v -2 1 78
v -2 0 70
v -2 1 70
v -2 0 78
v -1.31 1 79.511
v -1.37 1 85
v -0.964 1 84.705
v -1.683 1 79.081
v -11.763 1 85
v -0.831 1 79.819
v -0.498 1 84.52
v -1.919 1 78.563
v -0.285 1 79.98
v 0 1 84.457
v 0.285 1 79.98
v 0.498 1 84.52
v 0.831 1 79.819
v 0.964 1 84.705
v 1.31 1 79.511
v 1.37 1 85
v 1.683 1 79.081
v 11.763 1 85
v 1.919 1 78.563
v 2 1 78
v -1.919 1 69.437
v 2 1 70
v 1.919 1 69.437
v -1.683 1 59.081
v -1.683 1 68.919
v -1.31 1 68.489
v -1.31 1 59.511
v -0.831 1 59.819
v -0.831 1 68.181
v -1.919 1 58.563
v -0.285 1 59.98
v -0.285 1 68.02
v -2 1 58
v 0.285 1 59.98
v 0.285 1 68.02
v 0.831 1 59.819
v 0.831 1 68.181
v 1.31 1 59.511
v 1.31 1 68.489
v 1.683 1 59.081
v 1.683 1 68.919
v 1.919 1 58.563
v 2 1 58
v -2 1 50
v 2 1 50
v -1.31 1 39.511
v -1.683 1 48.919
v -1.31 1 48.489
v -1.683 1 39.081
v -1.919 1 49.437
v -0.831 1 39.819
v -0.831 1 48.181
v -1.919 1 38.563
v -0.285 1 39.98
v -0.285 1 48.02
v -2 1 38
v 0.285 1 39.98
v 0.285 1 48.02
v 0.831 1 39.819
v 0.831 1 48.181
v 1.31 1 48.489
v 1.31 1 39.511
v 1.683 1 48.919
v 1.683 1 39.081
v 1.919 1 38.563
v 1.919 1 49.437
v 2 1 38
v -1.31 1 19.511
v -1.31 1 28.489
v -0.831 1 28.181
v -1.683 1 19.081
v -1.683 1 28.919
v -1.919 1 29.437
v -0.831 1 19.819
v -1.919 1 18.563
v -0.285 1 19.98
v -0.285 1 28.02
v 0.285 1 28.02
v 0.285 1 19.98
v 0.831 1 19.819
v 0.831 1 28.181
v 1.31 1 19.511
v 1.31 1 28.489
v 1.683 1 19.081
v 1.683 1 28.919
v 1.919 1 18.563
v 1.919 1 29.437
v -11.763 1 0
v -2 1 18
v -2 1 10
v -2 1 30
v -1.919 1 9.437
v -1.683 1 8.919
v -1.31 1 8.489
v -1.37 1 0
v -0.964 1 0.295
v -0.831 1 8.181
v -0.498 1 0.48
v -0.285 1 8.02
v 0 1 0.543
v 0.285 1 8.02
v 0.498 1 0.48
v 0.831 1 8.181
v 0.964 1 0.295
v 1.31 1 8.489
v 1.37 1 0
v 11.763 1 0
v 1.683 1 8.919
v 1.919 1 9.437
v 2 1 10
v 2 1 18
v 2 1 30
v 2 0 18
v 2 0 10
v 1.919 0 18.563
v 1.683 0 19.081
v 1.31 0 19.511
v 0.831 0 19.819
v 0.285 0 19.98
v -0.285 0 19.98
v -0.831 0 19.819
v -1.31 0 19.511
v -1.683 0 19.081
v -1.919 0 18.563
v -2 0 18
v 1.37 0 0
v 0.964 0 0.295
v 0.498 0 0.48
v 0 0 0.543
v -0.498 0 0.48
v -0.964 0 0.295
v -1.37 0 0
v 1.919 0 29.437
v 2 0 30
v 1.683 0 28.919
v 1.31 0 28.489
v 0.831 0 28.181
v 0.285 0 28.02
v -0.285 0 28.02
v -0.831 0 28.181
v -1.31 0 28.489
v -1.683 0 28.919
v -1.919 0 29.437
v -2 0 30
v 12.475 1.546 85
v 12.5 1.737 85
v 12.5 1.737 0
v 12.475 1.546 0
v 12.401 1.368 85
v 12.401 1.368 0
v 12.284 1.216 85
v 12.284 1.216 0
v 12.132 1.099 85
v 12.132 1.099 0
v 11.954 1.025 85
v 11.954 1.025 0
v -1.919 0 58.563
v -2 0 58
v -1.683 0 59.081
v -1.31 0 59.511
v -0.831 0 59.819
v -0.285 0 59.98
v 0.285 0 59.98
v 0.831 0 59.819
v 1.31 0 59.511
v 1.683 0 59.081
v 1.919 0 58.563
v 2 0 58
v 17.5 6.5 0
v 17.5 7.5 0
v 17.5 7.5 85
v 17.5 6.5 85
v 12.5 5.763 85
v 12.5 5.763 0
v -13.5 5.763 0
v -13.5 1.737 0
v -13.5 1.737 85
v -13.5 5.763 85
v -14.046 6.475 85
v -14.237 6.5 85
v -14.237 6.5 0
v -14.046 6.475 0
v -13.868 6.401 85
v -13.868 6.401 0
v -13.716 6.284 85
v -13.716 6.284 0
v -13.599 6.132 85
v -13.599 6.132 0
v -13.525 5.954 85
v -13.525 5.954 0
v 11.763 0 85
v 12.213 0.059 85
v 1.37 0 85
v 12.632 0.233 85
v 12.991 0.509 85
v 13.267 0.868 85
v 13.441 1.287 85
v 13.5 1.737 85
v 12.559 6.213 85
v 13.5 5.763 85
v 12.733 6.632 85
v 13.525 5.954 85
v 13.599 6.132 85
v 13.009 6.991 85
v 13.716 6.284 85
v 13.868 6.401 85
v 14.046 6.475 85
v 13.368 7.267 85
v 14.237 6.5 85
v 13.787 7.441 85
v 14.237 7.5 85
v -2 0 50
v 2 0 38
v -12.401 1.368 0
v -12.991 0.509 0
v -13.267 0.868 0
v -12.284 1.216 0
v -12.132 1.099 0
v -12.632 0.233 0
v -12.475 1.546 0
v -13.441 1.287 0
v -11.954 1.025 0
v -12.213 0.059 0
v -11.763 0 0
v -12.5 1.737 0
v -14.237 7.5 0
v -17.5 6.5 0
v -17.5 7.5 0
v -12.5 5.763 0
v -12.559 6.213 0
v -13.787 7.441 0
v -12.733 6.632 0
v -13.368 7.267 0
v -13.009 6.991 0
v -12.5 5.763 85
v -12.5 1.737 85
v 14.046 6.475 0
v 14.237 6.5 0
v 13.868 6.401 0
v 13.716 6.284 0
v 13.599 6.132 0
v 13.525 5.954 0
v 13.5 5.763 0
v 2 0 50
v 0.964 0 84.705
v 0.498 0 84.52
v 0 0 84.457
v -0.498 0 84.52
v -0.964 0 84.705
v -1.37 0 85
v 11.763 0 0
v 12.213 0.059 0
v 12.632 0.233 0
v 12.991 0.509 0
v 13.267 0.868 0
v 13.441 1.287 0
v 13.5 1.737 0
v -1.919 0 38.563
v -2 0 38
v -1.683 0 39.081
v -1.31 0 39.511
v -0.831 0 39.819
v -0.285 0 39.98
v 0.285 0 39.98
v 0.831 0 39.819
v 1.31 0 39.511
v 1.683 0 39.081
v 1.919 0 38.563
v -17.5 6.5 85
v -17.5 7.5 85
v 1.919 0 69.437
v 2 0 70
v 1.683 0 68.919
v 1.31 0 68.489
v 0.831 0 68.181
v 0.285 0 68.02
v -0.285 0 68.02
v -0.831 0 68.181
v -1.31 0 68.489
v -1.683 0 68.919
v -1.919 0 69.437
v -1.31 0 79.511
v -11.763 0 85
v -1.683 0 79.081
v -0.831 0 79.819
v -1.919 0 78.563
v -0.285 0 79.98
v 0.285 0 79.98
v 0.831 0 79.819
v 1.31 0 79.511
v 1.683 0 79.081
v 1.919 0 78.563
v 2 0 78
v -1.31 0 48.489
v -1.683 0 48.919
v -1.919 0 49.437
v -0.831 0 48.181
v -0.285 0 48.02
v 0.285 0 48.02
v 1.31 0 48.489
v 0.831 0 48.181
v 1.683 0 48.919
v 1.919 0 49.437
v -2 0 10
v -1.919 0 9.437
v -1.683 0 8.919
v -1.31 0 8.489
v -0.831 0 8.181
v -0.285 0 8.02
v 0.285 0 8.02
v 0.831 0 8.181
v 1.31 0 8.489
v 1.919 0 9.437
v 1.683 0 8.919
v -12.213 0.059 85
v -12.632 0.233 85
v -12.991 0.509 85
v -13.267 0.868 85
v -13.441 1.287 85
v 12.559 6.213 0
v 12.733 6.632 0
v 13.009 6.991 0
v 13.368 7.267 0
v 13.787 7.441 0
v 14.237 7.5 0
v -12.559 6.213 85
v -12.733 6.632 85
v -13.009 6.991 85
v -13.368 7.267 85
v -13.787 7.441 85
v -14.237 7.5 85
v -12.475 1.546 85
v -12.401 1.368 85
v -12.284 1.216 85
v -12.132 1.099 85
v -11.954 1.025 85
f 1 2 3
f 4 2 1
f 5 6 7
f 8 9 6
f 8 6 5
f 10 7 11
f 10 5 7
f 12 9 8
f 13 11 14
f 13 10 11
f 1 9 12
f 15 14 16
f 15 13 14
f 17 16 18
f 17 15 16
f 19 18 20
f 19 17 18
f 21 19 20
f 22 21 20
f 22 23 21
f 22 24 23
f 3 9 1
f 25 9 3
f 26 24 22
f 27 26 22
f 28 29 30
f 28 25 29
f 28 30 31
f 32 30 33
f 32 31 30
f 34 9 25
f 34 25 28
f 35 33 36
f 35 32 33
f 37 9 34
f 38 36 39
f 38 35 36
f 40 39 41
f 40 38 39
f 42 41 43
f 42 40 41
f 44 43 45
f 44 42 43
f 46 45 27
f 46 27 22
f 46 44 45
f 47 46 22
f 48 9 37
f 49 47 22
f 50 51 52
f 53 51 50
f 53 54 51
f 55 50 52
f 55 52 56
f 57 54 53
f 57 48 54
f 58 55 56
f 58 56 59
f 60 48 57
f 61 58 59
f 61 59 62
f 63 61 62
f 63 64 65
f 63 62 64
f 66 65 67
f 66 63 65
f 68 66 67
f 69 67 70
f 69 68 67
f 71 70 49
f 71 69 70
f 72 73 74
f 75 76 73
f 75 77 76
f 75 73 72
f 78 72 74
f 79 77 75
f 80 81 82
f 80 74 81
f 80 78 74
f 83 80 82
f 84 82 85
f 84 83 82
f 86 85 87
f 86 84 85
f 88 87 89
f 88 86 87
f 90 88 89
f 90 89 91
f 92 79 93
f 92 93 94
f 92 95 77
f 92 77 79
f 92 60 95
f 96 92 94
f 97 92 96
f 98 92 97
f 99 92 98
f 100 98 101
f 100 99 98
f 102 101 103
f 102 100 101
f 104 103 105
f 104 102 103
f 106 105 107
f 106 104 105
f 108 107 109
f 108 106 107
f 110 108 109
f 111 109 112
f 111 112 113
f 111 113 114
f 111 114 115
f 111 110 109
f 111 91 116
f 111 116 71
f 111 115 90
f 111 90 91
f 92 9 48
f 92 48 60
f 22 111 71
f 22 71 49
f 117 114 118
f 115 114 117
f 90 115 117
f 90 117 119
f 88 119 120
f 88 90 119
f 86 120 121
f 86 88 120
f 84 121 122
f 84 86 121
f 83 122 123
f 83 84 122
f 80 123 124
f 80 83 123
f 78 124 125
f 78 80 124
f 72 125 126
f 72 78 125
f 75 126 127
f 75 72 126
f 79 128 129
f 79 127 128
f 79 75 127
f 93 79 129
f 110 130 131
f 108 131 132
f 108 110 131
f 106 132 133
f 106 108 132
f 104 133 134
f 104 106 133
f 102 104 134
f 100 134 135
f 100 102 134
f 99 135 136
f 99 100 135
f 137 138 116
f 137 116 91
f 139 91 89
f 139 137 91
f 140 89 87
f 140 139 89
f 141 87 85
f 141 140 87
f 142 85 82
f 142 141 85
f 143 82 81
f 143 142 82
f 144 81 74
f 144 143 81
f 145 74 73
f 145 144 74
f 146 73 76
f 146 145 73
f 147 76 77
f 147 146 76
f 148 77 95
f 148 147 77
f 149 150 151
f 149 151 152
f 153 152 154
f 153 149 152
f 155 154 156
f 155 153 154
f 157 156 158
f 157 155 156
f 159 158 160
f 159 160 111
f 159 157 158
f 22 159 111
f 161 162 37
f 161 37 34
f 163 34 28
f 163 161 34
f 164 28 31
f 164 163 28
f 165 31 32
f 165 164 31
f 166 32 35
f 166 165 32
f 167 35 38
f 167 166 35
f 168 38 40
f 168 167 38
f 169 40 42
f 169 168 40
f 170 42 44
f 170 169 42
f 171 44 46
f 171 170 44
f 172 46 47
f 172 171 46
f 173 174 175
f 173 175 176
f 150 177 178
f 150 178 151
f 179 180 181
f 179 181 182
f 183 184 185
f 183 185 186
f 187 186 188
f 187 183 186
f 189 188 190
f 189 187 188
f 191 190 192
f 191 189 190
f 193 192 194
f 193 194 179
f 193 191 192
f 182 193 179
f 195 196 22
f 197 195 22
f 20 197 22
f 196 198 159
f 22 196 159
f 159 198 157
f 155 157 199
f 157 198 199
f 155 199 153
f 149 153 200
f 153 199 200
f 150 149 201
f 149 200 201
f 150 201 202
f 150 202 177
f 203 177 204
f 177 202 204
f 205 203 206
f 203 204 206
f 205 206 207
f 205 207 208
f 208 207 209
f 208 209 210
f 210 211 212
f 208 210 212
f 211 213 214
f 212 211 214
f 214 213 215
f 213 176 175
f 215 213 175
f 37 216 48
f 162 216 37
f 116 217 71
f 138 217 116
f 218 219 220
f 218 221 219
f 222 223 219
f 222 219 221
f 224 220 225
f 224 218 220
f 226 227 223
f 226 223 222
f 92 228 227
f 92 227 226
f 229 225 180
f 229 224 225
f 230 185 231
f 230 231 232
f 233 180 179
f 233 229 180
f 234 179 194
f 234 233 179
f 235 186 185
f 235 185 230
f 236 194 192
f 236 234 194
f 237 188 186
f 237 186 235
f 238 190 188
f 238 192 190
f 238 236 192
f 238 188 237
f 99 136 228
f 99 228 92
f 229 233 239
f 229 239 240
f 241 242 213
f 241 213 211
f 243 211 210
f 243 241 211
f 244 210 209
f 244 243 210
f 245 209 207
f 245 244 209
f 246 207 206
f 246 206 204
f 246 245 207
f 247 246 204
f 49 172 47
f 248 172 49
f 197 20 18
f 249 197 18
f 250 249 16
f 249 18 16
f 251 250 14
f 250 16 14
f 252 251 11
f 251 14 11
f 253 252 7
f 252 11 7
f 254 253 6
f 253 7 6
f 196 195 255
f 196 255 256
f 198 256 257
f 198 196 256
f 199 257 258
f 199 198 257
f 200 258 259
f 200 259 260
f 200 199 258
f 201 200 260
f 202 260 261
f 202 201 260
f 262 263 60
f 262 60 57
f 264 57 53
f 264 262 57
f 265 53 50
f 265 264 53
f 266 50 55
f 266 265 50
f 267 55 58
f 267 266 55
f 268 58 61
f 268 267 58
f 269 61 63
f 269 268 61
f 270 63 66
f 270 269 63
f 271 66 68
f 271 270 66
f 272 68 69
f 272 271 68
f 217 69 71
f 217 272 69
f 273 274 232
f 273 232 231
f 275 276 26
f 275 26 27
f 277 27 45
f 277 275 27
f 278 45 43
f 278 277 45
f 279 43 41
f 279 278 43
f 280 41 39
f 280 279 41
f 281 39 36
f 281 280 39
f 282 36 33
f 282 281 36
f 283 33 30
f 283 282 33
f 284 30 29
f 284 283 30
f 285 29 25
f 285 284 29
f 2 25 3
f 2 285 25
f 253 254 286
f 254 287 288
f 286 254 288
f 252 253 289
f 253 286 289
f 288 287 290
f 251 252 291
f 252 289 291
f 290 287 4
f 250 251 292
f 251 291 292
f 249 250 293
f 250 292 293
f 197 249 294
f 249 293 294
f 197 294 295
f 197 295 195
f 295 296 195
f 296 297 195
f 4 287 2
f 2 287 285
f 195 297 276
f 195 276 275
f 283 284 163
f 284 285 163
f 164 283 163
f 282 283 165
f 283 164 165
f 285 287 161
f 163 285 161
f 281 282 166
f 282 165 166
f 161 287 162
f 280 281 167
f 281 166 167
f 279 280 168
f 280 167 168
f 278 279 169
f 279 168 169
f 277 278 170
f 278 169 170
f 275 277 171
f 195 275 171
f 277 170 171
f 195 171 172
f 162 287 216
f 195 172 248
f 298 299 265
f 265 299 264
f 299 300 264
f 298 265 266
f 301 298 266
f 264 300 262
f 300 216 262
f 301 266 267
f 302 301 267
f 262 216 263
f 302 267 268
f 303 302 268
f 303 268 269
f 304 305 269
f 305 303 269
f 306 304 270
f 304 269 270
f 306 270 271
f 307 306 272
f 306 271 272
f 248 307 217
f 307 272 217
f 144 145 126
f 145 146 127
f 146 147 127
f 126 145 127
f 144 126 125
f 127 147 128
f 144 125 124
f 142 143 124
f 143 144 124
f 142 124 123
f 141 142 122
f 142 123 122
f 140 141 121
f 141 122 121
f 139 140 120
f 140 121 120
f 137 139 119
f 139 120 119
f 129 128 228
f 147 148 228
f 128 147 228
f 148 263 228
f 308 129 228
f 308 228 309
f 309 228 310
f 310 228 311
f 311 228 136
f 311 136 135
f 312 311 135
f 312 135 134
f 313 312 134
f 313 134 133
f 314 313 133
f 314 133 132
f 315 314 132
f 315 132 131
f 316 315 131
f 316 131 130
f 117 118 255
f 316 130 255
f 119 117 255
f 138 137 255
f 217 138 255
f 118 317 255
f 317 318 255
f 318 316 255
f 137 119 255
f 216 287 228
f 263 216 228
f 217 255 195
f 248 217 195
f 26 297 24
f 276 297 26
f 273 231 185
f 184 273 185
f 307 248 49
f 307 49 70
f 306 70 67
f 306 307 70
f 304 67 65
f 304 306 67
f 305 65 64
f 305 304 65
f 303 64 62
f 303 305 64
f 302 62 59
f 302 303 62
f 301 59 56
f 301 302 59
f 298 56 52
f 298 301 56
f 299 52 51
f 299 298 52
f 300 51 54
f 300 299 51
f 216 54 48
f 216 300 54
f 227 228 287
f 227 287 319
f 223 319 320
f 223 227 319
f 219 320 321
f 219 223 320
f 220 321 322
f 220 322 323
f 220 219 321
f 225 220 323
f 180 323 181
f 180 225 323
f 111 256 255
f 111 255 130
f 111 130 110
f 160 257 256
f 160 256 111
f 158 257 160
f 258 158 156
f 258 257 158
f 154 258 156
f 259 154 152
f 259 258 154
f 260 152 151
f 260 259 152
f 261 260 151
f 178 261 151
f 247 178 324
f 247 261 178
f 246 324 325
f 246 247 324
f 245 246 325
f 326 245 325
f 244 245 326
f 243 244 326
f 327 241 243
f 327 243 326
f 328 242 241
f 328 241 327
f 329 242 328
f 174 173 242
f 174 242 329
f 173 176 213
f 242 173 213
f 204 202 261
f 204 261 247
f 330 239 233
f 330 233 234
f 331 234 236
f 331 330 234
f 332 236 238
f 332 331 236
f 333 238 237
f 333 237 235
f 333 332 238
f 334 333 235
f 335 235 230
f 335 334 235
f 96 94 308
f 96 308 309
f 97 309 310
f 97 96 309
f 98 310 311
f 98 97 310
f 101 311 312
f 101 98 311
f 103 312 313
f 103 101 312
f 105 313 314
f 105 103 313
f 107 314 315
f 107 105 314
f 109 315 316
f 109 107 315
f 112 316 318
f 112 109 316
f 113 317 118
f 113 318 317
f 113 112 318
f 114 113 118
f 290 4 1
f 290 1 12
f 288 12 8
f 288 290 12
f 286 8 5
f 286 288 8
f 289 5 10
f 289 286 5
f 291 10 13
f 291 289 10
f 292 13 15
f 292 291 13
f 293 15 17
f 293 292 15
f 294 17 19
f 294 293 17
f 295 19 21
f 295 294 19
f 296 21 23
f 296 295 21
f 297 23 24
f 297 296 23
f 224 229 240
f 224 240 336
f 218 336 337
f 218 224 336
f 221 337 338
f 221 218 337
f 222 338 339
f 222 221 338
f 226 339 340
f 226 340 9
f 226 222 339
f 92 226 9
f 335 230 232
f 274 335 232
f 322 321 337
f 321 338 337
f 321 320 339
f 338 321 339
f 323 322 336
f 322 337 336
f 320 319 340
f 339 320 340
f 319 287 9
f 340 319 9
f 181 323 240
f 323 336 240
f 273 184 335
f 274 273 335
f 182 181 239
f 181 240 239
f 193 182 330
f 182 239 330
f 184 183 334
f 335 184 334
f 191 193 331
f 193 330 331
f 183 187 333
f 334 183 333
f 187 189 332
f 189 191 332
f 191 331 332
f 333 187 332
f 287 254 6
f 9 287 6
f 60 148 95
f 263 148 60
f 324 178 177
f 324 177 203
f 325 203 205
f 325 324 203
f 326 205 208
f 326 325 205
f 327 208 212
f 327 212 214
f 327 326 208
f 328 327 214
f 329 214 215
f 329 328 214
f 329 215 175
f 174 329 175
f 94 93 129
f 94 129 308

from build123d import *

# Parameters (mm, degrees)
SKETCH_1_W                         = 27
SKETCH_1_H                         = 1
SM_BASE_FLANGE_1_DEPTH             = 85
SM_EDGE_FLANGE_1_STRIP_W           = 5.4732
SM_EDGE_FLANGE_1_STRIP_H           = 1
SM_EDGE_FLANGE_1_STRIP_CUT_DEPTH   = 85
SM_EDGE_FLANGE_1_STRIP_2_W         = 5.4732
SM_EDGE_FLANGE_1_STRIP_2_H         = 1
SM_EDGE_FLANGE_1_STRIP_CUT_2_DEPTH = 85
SM_EDGE_FLANGE_1_DEPTH             = 85
SM_EDGE_FLANGE_1_BEND_DEPTH        = 85
SM_EDGE_FLANGE_2_STRIP_W           = 5.4732
SM_EDGE_FLANGE_2_STRIP_H           = 1
SM_EDGE_FLANGE_2_STRIP_CUT_DEPTH   = 85
SM_EDGE_FLANGE_2_STRIP_2_W         = 5.4732
SM_EDGE_FLANGE_2_STRIP_2_H         = 1
SM_EDGE_FLANGE_2_STRIP_CUT_2_DEPTH = 85
SM_EDGE_FLANGE_2_DEPTH             = 85
SM_EDGE_FLANGE_2_BEND_DEPTH        = 85
CUT_EXTRUDE_2_DEPTH                = 88.025858226
CUT_EXTRUDE_1_REACH                = 89.026
OTHER_3_DEPTH                      = 1


# Read off the part's stored shape, not the designer's step: Образец заполнения3
# Sheet-metal steps are written as plain solids
with BuildPart() as part:
    # Sketch 1 → Базовая кромка1 (new body)
    with BuildSketch(Plane.XY):
        with Locations((0, 0.5)):
            Rectangle(SKETCH_1_W, SKETCH_1_H)
    extrude(amount=SM_BASE_FLANGE_1_DEPTH)

    # Ребро-кромка1 strip (across the edge) → Ребро-кромка1 strip cut (cut)
    with BuildSketch(Plane(origin=(-13.5, 1, 0), x_dir=(1, 0, 0), z_dir=(0, 0, 1))):
        with Locations((-1, -0.5)):
            Rectangle(SM_EDGE_FLANGE_1_STRIP_W, SM_EDGE_FLANGE_1_STRIP_H)
    extrude(amount=SM_EDGE_FLANGE_1_STRIP_CUT_DEPTH, mode=Mode.SUBTRACT)

    # Ребро-кромка1 strip 2 (across the edge) → Ребро-кромка1 strip cut 2 (cut)
    with BuildSketch(Plane(origin=(13.5, 1, 85), x_dir=(-1, 0, 0), z_dir=(0, 0, -1))):
        with Locations((-1, -0.5)):
            Rectangle(SM_EDGE_FLANGE_1_STRIP_2_W, SM_EDGE_FLANGE_1_STRIP_2_H)
    extrude(amount=SM_EDGE_FLANGE_1_STRIP_CUT_2_DEPTH, mode=Mode.SUBTRACT)

    # Ребро-кромка1 section (across the edge) → Ребро-кромка1 (add)
    with BuildSketch(Plane(origin=(-13.5, 1, 0), x_dir=(1, 0, 0), z_dir=(0, 0, 1))):
        with BuildLine():
            Line((0, 0.7366), (0, 6.5))
            Line((0, 6.5), (1, 6.5))
            Line((1, 6.5), (1, 0.7366))
            ThreePointArc((1, 0.7366), (1.215745145, 0.215745145), (1.7366, 0))
            Line((1.7366, 0), (1.7366, -1))
            ThreePointArc((1.7366, -1), (0.508638364, -0.491361636), (0, 0.7366))
        make_face()
    extrude(amount=SM_EDGE_FLANGE_1_DEPTH)

    # Ребро-кромка1 section 2 (across the edge) → Ребро-кромка1 bend (add)
    with BuildSketch(Plane(origin=(13.5, 1, 85), x_dir=(-1, 0, 0), z_dir=(0, 0, -1))):
        with BuildLine():
            Line((0, 0.7366), (0, 6.5))
            Line((0, 6.5), (1, 6.5))
            Line((1, 6.5), (1, 0.7366))
            ThreePointArc((1, 0.7366), (1.215745145, 0.215745145), (1.7366, 0))
            Line((1.7366, 0), (1.7366, -1))
            ThreePointArc((1.7366, -1), (0.508638364, -0.491361636), (0, 0.7366))
        make_face()
    extrude(amount=SM_EDGE_FLANGE_1_BEND_DEPTH)

    # Ребро-кромка2 strip (across the edge) → Ребро-кромка2 strip cut (cut)
    with BuildSketch(Plane(origin=(-13.5, 7.5, 85), x_dir=(0, -1, 0), z_dir=(0, 0, -1))):
        with Locations((-1, -0.5)):
            Rectangle(SM_EDGE_FLANGE_2_STRIP_W, SM_EDGE_FLANGE_2_STRIP_H)
    extrude(amount=SM_EDGE_FLANGE_2_STRIP_CUT_DEPTH, mode=Mode.SUBTRACT)

    # Ребро-кромка2 strip 2 (across the edge) → Ребро-кромка2 strip cut 2 (cut)
    with BuildSketch(Plane(origin=(13.5, 7.5, 0), x_dir=(0, -1, 0), z_dir=(0, 0, 1))):
        with Locations((-1, -0.5)):
            Rectangle(SM_EDGE_FLANGE_2_STRIP_2_W, SM_EDGE_FLANGE_2_STRIP_2_H)
    extrude(amount=SM_EDGE_FLANGE_2_STRIP_CUT_2_DEPTH, mode=Mode.SUBTRACT)

    # Ребро-кромка2 section (across the edge) → Ребро-кромка2 (add)
    with BuildSketch(Plane(origin=(-13.5, 7.5, 85), x_dir=(0, -1, 0), z_dir=(0, 0, -1))):
        with BuildLine():
            Line((0, 0.7366), (0, 4))
            Line((0, 4), (1, 4))
            Line((1, 4), (1, 0.7366))
            ThreePointArc((1, 0.7366), (1.215745145, 0.215745145), (1.7366, 0))
            Line((1.7366, 0), (1.7366, -1))
            ThreePointArc((1.7366, -1), (0.508638364, -0.491361636), (0, 0.7366))
        make_face()
    extrude(amount=SM_EDGE_FLANGE_2_DEPTH)

    # Ребро-кромка2 section 2 (across the edge) → Ребро-кромка2 bend (add)
    with BuildSketch(Plane(origin=(13.5, 7.5, 0), x_dir=(0, -1, 0), z_dir=(0, 0, 1))):
        with BuildLine():
            Line((0, 0.7366), (0, 4))
            Line((0, 4), (1, 4))
            Line((1, 4), (1, 0.7366))
            ThreePointArc((1, 0.7366), (1.215745145, 0.215745145), (1.7366, 0))
            Line((1.7366, 0), (1.7366, -1))
            ThreePointArc((1.7366, -1), (0.508638364, -0.491361636), (0, 0.7366))
        make_face()
    extrude(amount=SM_EDGE_FLANGE_2_BEND_DEPTH)

    # Эскиз19 → Вырез-Вытянуть2 (cut, through all)
    with BuildSketch(Plane(origin=(0, 1, 0), x_dir=(1, 0, 0), z_dir=(0, 1, 0))):
        with BuildLine():
            Line((-1.370314889, 0), (1.370314889, 0))
            ThreePointArc((1.370314889, 0), (0, -0.54321), (-1.370314889, 0))
        make_face()
        with BuildLine():
            Line((-1.370314889, -85), (1.370314889, -85))
            ThreePointArc((1.370314889, -85), (0, -84.45679), (-1.370314889, -85))
        make_face()
    extrude(amount=-CUT_EXTRUDE_2_DEPTH, mode=Mode.SUBTRACT)

    # Эскиз18 → Вырез-Вытянуть1 (cut, up to next)
    with BuildSketch(Plane(origin=(0, 1, 0), x_dir=(1, 0, 0), z_dir=(0, 1, 0)), mode=Mode.PRIVATE) as cut_extrude_1_sk1:
        with BuildLine():
            Line((-2, -18), (-2, -10))
            ThreePointArc((-2, -10), (0, -8), (2, -10))
            Line((2, -10), (2, -18))
            ThreePointArc((2, -18), (0, -20), (-2, -18))
        make_face()
    cut_extrude_1_tool1 = extrude(cut_extrude_1_sk1.sketch, amount=-CUT_EXTRUDE_1_REACH, mode=Mode.PRIVATE) & part.part
    add(cut_extrude_1_tool1.solids().sort_by_distance((0, 1, 14))[0], mode=Mode.SUBTRACT)

    # Образец заполнения3 outline → Образец заполнения3 (cut)
    with BuildSketch(Plane(origin=(0, 0, 0), x_dir=(1, 0, 0), z_dir=(0, 1, 0))):
        with BuildLine():
            ThreePointArc((2, -30), (0, -28), (-2, -30))
            Line((-2, -30), (-2, -38))
            ThreePointArc((-2, -38), (0, -40), (2, -38))
            Line((2, -38), (2, -30))
        make_face()
        with BuildLine():
            ThreePointArc((2, -70), (0, -68), (-2, -70))
            Line((-2, -70), (-2, -78))
            ThreePointArc((-2, -78), (0, -80), (2, -78))
            Line((2, -78), (2, -70))
        make_face()
        with BuildLine():
            ThreePointArc((2, -50), (0, -48), (-2, -50))
            Line((-2, -50), (-2, -58))
            ThreePointArc((-2, -58), (0, -60), (2, -58))
            Line((2, -58), (2, -50))
        make_face()
    extrude(amount=OTHER_3_DEPTH, mode=Mode.SUBTRACT)


solid = part.part
